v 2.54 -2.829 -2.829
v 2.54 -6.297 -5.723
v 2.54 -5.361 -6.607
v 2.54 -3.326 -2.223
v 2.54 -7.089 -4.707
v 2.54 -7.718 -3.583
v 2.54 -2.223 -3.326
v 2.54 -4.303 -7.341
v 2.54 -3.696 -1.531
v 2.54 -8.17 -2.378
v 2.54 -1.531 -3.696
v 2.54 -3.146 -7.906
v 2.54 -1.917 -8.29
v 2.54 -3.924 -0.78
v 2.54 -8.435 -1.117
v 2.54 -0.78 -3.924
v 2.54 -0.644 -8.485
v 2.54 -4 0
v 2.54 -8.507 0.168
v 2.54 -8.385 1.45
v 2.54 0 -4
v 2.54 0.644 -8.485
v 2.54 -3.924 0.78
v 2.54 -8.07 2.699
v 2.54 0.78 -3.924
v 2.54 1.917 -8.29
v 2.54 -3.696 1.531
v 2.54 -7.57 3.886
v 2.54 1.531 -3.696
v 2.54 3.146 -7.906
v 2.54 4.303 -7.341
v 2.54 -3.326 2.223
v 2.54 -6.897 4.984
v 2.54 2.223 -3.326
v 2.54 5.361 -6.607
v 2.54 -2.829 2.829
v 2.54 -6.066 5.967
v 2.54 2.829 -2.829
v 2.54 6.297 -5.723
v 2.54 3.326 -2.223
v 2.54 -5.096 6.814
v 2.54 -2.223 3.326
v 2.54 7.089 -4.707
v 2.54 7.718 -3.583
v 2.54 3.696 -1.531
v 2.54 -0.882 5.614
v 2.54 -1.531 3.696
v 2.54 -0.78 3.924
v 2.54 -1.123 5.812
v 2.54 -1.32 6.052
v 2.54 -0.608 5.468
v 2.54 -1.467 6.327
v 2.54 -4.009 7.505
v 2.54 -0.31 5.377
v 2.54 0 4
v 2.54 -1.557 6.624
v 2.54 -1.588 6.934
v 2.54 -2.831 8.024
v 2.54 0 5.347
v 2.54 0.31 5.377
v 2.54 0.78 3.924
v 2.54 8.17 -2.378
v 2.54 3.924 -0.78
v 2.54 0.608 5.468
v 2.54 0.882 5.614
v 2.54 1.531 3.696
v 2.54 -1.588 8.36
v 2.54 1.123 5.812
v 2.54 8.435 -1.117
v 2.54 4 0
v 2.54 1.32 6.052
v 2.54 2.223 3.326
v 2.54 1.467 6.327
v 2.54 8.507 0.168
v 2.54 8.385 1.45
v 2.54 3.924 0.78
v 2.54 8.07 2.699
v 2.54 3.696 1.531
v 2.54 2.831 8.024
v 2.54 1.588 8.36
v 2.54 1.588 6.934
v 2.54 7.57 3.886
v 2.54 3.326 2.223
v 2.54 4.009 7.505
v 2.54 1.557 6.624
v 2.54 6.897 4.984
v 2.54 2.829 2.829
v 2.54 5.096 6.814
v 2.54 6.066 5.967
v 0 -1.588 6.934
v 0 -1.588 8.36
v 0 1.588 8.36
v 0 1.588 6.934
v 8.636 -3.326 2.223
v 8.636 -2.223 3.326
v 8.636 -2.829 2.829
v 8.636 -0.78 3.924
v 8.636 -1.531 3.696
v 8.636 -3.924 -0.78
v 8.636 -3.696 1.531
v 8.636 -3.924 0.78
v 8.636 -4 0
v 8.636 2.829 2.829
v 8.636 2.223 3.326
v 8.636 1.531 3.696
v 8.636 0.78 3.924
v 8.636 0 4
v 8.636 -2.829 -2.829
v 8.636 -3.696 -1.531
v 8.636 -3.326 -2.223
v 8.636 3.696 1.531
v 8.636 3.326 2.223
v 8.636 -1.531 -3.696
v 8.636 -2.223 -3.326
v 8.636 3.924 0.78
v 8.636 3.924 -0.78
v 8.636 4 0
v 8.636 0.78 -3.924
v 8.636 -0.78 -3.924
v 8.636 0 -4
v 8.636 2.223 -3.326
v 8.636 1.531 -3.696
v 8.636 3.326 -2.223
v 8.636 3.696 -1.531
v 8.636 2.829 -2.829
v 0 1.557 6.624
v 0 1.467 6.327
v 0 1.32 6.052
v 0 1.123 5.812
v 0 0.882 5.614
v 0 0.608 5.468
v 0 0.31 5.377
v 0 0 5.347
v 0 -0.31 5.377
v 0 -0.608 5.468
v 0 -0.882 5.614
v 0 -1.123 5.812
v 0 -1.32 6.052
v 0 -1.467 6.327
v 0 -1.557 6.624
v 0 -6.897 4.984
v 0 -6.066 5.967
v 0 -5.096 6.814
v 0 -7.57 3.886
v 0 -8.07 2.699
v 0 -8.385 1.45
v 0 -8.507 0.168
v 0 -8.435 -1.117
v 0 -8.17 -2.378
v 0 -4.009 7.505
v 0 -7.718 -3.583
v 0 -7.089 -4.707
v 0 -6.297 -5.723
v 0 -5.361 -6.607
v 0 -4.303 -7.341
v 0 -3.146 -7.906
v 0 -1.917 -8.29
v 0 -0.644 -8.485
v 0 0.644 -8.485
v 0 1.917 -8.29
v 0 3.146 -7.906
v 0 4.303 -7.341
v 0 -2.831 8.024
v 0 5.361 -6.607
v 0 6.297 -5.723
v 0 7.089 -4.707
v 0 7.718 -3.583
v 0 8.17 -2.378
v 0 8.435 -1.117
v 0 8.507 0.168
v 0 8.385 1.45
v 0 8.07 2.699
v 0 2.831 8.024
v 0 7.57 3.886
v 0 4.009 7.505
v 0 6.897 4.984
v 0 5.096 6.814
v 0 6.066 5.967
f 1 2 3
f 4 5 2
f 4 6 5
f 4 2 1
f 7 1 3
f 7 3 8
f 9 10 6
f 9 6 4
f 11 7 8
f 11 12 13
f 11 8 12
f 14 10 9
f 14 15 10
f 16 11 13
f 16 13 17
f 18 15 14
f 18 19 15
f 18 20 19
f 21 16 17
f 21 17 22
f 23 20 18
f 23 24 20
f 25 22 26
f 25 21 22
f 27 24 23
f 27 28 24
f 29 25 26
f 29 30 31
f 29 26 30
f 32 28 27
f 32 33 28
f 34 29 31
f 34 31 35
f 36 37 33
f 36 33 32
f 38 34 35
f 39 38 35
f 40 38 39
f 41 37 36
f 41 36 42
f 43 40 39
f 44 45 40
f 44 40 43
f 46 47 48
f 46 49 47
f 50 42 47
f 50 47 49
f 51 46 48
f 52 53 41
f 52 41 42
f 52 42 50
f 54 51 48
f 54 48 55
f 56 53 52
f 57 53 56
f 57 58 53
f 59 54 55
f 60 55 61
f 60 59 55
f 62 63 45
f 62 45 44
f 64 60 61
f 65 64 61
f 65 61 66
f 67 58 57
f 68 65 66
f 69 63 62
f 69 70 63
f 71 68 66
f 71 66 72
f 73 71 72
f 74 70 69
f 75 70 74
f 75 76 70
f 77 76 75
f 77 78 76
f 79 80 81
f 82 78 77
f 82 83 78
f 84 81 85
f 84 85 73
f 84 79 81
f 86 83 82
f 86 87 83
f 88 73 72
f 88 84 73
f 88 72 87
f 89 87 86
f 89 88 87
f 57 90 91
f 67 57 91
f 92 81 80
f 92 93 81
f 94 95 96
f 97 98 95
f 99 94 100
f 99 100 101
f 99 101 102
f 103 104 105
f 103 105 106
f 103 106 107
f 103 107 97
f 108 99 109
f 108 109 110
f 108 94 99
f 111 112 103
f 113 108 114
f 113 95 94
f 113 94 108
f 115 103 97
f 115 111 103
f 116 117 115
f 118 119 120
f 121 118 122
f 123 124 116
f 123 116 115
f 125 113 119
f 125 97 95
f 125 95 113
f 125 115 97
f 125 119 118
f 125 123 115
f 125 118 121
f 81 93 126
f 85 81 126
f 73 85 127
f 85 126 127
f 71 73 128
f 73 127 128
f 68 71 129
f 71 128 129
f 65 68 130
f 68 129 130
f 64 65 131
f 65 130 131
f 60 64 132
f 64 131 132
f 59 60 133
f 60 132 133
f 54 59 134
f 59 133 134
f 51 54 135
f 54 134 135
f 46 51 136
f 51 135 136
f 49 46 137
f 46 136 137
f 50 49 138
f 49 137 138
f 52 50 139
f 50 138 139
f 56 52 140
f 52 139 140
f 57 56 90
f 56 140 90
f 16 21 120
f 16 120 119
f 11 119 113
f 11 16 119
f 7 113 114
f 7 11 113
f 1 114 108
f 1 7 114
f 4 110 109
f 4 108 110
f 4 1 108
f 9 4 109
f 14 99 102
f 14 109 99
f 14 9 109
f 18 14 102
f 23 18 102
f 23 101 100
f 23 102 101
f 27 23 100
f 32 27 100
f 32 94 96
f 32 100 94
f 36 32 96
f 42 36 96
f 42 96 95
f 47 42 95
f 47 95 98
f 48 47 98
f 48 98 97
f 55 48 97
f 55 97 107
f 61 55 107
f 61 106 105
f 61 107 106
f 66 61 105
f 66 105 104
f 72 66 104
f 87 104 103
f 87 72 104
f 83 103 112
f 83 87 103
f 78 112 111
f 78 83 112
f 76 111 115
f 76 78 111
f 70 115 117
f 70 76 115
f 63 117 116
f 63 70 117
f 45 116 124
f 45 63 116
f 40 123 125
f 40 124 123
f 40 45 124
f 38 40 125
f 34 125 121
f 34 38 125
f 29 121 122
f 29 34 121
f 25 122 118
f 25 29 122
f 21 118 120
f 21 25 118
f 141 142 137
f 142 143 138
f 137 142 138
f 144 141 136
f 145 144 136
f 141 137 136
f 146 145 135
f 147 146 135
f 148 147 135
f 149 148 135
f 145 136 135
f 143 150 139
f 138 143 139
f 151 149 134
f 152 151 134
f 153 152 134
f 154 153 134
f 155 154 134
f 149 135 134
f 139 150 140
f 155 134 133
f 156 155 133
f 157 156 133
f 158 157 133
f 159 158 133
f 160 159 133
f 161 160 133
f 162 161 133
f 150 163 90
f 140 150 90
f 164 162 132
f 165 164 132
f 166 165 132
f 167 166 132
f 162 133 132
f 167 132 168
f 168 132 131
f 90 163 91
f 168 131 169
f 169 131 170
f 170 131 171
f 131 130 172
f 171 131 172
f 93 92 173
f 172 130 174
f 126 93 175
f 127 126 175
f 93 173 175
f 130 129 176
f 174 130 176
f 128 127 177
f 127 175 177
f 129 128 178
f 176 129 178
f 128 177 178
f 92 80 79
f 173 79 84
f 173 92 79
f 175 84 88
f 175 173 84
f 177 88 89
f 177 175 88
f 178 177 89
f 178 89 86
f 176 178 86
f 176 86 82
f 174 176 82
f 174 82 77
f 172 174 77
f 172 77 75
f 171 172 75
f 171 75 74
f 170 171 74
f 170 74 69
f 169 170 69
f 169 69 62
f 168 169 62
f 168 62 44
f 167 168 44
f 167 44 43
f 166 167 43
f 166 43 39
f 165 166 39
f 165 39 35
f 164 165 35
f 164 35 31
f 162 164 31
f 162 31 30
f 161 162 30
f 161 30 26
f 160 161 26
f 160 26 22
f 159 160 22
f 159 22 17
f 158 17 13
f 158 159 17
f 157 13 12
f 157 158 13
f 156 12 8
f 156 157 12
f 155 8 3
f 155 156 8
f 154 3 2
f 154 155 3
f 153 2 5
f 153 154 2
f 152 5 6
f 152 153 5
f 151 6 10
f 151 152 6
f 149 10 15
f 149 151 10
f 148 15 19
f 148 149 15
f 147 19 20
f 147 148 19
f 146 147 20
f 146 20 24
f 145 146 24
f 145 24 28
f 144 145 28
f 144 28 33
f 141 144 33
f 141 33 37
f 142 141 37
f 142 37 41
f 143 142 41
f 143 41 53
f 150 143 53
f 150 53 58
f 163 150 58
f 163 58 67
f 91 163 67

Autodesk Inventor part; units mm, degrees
ref_plane "YZ Plane" through (0, 0, 0) normal (1, 0, 0) x (0, 1, 0)
ref_plane "XZ Plane" through (0, 0, 0) normal (0, 1, 0) x (-1, 0, 0)
ref_plane "XY Plane" through (0, 0, 0) normal (0, 0, 1) x (1, 0, 0)
sketch "Sketch1" plane through (0, 0, 0) normal (1, 0, 0) x (0, 1, 0)
  circle A0 centre (0, 0) radius 8.509
  dimension "d1" = 17.018
extrude "Extrusion1" add sketch "Sketch1" along normal blind 2.54
sketch "Sketch2" plane through (2.54, 0, 0) normal (1, 0, 0) x (0, 0, -1)
  circle A0 centre (0, 0) radius 8.509 projected
  circle A1 centre (0, 0) radius 4.0005
  dimension "d5" = 8.001
extrude "Extrusion2" add sketch "Sketch2" along normal blind 6.096 contours A1
sketch "Sketch3" plane through (0, 0, 0) normal (-1, 0, 0) x (0, 0, 1)
  circle A0 centre (0, 0) radius 8.509 projected
  circle A1 centre (6.9342, 0) radius 1.5875
  line L0 (6.9342, -1.5875) -> (8.3596, -1.5875)
  line L1 (6.9342, 1.5875) -> (8.3596, 1.5875)
  line L2 (6.9342, 0) -> (0, 0)
  dimension "d8" = 6.9342
  dimension "d9" = 3.175
extrude "Extrusion3" cut sketch "Sketch3" against normal through all contours A0 A1 L1 | L0 A1 A0 | A1 A0 | A0 A1
properties part number "Pulley Shaft" material "Steel"
